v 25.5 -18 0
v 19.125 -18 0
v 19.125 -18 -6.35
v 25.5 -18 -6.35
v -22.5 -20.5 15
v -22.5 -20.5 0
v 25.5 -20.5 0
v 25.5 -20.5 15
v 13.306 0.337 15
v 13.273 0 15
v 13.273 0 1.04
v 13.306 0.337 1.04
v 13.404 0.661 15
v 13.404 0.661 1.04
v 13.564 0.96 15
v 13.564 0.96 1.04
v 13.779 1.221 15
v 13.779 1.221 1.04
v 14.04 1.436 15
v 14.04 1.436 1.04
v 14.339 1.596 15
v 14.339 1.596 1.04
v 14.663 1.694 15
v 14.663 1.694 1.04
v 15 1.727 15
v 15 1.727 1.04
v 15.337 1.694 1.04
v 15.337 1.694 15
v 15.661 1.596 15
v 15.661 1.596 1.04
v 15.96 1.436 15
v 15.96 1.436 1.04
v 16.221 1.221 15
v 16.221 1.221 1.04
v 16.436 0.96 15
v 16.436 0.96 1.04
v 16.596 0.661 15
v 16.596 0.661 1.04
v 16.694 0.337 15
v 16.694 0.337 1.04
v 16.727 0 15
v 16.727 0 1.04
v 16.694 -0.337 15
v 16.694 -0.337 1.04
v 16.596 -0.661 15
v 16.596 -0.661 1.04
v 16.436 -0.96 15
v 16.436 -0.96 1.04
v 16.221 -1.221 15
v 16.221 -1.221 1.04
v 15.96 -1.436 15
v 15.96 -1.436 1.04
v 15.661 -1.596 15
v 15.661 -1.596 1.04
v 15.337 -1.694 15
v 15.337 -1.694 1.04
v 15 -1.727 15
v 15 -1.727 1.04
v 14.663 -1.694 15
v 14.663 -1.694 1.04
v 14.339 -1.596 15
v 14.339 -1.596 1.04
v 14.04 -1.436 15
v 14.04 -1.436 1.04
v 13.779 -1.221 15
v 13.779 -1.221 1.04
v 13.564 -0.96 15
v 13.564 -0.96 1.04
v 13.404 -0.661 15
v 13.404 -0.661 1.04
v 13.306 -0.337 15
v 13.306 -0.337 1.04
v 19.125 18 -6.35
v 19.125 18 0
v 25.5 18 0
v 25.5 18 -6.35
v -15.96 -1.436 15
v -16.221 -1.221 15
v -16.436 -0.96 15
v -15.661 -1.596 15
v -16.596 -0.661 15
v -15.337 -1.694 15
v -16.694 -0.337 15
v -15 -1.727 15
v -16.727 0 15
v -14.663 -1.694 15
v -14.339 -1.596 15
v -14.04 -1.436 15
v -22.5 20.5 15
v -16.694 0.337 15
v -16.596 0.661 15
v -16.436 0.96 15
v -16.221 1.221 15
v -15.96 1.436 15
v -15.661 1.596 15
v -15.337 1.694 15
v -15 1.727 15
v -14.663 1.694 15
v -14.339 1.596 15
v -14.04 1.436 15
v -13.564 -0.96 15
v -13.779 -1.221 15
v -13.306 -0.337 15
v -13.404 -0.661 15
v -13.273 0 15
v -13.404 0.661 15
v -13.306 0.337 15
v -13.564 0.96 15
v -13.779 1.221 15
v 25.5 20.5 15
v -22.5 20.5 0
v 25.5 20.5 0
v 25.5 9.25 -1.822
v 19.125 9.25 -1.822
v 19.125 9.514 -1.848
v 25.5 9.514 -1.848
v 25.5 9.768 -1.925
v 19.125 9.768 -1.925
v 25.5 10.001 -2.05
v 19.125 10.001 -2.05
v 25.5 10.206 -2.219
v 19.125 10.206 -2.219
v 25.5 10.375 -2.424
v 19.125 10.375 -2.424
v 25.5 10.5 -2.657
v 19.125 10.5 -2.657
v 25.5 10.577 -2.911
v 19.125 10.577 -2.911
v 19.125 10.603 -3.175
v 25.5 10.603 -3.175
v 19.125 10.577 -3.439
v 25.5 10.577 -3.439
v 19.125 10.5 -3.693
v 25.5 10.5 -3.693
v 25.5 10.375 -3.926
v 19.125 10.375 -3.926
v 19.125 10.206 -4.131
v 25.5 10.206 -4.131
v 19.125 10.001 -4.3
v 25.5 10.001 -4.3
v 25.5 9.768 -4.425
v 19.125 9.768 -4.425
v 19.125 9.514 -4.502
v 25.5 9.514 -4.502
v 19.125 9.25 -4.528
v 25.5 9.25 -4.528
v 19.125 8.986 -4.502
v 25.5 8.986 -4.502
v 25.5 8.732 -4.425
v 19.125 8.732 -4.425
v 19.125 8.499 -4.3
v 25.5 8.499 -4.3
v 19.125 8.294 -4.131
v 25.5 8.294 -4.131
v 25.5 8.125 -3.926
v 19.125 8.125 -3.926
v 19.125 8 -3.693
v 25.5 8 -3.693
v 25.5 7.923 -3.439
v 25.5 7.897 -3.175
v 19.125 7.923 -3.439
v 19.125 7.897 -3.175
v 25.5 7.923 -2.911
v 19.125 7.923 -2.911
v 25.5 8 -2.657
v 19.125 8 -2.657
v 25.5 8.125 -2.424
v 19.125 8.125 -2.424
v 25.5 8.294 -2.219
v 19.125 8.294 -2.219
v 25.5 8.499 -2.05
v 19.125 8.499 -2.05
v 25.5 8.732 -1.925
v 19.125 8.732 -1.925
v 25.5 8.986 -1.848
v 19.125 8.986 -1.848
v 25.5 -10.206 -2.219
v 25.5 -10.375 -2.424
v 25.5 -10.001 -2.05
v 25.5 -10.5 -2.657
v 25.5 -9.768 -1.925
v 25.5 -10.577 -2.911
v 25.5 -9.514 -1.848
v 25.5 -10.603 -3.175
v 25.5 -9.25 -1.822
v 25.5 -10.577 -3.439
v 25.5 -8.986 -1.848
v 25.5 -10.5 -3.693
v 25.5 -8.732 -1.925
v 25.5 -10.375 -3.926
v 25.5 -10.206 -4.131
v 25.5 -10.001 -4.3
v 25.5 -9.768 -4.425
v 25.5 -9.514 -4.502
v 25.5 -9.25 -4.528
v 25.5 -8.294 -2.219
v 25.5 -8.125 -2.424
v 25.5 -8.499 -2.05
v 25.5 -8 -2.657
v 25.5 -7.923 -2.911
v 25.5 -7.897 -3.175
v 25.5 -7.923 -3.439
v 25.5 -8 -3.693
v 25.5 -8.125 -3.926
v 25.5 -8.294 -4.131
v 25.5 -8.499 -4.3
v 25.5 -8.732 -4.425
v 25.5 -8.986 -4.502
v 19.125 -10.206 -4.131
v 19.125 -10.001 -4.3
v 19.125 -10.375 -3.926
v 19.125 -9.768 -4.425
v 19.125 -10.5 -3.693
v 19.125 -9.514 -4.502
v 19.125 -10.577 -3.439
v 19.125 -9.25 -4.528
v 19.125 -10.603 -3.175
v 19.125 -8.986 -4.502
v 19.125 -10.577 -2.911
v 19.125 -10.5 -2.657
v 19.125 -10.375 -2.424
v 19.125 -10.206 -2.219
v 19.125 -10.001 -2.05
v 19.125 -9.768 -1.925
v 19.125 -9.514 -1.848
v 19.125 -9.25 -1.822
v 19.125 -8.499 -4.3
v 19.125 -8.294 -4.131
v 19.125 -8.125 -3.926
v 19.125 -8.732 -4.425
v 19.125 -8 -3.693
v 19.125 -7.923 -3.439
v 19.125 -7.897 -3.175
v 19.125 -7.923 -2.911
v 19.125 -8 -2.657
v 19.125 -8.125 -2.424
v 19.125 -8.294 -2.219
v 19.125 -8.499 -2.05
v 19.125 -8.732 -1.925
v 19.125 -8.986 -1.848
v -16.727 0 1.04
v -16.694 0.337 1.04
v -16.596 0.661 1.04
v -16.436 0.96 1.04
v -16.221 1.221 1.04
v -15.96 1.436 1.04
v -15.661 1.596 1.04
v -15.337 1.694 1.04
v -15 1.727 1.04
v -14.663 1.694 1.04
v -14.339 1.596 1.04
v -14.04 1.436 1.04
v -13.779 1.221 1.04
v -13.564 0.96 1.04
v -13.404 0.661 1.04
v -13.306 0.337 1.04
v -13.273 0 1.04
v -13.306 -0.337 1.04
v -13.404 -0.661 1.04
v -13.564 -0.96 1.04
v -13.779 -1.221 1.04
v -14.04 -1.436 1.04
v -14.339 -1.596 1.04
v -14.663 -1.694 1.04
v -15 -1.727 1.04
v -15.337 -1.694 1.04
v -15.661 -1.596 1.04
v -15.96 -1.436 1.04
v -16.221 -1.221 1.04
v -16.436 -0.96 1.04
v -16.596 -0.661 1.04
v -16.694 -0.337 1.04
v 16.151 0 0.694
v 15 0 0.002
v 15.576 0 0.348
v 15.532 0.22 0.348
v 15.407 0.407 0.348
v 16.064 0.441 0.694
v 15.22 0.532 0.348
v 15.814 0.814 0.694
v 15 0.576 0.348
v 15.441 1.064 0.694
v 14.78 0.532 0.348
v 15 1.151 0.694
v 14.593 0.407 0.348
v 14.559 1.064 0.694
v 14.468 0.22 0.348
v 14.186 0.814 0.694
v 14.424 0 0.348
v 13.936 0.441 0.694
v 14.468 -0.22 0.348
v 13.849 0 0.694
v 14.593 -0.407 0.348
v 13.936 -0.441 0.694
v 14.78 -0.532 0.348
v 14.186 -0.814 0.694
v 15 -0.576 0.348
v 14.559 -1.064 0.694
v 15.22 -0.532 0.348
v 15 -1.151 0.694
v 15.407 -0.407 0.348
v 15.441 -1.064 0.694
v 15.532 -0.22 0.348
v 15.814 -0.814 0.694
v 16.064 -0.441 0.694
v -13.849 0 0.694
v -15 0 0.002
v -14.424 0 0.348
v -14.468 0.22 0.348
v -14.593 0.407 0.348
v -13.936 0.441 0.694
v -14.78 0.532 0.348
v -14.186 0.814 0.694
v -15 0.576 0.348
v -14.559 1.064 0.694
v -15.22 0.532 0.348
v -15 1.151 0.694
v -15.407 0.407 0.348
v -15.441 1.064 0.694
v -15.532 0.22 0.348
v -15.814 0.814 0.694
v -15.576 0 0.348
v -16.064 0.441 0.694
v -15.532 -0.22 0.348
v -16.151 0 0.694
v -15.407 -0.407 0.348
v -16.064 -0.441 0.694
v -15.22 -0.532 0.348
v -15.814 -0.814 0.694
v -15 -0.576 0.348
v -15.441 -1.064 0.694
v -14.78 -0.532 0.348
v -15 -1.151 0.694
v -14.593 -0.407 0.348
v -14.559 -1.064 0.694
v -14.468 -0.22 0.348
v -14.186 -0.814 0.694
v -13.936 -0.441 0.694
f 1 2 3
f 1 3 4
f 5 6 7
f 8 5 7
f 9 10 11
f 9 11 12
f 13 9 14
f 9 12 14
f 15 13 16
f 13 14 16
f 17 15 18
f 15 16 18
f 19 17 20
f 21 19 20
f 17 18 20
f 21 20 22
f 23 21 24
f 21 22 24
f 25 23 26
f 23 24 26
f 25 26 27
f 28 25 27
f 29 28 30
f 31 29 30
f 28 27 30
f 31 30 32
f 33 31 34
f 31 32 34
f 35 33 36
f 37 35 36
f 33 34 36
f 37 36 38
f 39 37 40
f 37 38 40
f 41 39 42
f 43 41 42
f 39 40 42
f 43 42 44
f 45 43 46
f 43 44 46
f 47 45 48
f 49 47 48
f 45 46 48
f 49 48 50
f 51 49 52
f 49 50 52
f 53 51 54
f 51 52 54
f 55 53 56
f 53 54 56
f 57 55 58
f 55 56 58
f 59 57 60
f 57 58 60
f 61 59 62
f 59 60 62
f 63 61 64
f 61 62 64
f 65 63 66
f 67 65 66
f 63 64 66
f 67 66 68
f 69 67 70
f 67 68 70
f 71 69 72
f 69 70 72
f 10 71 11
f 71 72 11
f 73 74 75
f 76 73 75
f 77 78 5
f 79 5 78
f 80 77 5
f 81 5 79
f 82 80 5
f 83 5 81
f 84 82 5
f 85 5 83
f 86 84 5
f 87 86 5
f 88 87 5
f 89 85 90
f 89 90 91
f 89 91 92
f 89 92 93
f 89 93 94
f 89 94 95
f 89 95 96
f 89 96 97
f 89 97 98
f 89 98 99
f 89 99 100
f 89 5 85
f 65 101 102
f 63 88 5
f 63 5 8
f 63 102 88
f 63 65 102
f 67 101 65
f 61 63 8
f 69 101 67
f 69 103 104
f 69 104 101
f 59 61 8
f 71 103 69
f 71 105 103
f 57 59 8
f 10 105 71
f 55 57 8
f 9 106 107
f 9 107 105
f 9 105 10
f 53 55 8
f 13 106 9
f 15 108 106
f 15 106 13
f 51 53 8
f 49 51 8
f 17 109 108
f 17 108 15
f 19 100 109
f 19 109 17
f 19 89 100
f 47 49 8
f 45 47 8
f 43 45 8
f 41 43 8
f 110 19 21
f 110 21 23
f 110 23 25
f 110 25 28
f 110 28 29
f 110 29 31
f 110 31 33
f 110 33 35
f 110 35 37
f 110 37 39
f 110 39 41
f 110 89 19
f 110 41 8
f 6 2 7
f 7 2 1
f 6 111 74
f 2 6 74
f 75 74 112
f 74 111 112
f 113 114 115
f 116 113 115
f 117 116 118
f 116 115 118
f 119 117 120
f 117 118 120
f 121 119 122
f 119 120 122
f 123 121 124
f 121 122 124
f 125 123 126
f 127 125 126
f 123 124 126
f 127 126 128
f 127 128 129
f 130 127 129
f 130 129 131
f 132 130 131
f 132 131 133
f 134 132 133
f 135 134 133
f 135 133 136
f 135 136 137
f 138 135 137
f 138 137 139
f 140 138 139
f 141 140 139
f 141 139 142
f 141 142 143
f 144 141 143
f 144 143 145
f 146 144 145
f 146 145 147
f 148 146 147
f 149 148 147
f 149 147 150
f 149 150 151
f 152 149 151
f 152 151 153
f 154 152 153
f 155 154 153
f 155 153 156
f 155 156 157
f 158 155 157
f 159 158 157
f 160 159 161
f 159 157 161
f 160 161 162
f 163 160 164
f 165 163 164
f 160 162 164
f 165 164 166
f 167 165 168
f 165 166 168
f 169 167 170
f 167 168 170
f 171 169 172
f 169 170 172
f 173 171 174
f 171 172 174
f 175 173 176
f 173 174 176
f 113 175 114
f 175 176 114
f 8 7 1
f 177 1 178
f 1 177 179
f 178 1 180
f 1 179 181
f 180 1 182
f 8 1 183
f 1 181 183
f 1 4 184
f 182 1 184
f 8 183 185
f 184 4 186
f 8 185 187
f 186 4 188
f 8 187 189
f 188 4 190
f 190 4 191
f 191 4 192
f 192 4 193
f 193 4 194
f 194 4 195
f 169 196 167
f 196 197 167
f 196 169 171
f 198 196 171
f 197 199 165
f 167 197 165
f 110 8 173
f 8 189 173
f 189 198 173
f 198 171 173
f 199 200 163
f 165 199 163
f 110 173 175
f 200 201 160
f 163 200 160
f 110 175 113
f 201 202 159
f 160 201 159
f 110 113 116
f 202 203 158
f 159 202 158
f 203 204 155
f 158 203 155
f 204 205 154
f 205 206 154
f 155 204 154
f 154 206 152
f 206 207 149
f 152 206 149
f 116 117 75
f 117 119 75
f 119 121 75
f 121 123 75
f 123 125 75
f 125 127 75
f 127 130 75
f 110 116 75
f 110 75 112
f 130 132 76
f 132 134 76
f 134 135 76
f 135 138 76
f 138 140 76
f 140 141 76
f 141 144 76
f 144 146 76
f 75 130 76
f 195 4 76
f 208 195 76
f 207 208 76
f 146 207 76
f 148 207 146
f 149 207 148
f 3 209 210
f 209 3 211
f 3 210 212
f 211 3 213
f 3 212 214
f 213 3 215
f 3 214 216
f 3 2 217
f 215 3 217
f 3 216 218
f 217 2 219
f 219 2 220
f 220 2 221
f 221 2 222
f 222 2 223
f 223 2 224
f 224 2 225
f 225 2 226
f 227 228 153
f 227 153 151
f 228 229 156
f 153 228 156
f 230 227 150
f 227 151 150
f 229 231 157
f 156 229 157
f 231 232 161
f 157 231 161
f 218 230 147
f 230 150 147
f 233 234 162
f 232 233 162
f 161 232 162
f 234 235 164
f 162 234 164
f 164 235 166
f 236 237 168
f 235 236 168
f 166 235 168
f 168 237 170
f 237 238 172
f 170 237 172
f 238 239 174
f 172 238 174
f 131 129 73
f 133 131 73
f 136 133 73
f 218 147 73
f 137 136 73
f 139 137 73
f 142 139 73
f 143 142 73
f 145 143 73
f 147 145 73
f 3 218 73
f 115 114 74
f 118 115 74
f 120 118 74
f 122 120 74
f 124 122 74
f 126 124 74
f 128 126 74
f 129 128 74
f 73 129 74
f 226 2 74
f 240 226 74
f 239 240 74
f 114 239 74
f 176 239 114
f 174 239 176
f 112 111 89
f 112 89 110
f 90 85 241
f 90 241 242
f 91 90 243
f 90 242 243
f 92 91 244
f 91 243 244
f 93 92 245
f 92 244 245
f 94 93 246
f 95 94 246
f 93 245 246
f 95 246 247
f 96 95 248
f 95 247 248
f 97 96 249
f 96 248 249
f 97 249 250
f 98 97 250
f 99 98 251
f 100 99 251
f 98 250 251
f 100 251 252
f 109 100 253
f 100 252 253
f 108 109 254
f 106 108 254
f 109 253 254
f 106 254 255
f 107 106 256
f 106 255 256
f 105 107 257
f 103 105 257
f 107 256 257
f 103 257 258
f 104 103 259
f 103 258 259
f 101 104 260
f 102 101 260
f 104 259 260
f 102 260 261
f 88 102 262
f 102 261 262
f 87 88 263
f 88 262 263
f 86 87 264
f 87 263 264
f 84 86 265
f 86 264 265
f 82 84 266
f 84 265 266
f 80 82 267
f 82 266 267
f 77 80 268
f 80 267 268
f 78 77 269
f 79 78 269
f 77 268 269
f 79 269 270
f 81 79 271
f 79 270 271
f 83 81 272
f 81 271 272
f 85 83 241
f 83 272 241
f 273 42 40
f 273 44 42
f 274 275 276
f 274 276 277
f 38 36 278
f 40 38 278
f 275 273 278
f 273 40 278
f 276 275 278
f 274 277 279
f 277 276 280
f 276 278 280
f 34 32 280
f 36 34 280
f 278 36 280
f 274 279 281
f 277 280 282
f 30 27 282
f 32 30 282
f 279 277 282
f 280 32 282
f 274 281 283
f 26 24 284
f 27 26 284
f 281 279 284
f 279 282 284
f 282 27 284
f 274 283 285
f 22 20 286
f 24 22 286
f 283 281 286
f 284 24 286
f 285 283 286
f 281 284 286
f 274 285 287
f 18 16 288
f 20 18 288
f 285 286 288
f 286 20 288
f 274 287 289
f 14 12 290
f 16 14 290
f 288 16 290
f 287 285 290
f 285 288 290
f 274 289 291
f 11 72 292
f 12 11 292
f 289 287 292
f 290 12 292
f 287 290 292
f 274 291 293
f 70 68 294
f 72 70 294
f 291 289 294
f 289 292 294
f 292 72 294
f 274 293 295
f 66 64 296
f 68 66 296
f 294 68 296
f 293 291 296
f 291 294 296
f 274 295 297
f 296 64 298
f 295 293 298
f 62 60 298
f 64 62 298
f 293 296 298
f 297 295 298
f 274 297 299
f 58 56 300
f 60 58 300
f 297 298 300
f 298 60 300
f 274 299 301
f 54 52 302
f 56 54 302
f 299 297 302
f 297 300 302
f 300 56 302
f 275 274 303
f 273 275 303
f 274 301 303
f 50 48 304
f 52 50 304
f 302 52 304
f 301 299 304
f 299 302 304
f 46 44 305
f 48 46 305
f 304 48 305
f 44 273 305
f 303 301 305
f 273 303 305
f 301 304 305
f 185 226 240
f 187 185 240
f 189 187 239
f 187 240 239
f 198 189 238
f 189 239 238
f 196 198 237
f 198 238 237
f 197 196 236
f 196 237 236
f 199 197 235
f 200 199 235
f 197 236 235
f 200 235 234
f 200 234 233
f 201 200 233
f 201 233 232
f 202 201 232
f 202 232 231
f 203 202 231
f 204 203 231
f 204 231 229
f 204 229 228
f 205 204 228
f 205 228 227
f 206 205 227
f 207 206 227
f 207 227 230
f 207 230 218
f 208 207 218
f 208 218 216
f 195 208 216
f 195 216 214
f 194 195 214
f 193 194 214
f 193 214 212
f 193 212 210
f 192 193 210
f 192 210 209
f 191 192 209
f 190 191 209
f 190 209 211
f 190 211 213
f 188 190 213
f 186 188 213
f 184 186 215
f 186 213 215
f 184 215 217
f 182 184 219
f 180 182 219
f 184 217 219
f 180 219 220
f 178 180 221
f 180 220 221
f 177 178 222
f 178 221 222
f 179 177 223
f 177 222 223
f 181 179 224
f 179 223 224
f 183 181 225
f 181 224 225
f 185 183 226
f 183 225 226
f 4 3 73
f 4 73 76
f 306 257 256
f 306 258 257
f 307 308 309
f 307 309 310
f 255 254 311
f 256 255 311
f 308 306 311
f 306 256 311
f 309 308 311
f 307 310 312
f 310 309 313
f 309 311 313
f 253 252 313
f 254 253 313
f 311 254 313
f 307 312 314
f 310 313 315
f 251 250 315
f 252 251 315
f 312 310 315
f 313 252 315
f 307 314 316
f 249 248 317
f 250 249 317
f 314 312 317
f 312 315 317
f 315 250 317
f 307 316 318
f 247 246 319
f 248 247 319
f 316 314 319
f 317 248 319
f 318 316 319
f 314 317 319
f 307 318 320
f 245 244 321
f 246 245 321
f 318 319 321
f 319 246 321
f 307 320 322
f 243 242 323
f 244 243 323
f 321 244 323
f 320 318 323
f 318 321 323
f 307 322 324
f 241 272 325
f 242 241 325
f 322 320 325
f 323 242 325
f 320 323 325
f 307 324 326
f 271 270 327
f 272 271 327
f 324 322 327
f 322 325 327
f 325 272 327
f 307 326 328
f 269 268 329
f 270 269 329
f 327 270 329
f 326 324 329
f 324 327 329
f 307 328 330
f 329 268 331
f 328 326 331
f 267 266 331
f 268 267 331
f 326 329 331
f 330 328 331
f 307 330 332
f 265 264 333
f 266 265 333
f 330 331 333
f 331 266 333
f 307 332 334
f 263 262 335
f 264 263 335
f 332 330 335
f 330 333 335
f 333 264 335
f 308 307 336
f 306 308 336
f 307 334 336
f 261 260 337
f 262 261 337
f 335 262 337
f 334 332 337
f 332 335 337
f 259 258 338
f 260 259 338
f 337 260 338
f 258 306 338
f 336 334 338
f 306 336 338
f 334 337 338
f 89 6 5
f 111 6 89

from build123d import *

# Parameters (mm, degrees)
SKETCH1_W                 = 48
SKETCH1_H                 = 41
BASE_EXTRUSION_DEPTH      = 15
SKETCH1_14_W              = 6.375
SKETCH1_14_H              = 36
CLEARANCE_EXTENSION_DEPTH = 6.35
F_8_32_TAPPED_HOLE6_D     = 3.4544
F_8_32_TAPPED_HOLE6_DEPTH = 13.96
F_8_32_TAPPED_HOLE6_TIP   = 1.037806461
F_6_32_TAPPED_HOLE1_D     = 2.7051


with BuildPart() as part:
    # Sketch1 → Base Extrusion (new body)
    with BuildSketch(Plane.XY):
        with Locations((1.5, 0)):
            Rectangle(SKETCH1_W, SKETCH1_H)
    extrude(amount=BASE_EXTRUSION_DEPTH)

    # Sketch1<14> → Clearance Extension (add)
    with BuildSketch(Plane.XY):
        with Locations((22.3125, 0)):
            Rectangle(SKETCH1_14_W, SKETCH1_14_H)
    extrude(amount=-CLEARANCE_EXTENSION_DEPTH)

    # #8-32 Tapped Hole6
    with Locations(Plane(origin=(15, 0, 15), x_dir=(1, 0, 0), z_dir=(0, 0, 1))):
        with Locations((0, 0), (-30, 0)):
            Hole(F_8_32_TAPPED_HOLE6_D / 2, depth=F_8_32_TAPPED_HOLE6_DEPTH)
            with Locations((0, 0, -(F_8_32_TAPPED_HOLE6_DEPTH + F_8_32_TAPPED_HOLE6_TIP / 2))):  # 118° drill point
                Cone(0, F_8_32_TAPPED_HOLE6_D / 2, F_8_32_TAPPED_HOLE6_TIP, mode=Mode.SUBTRACT)

    # #6-32 Tapped Hole1 (through all)
    with Locations(Plane(origin=(25.5, 0, 0), x_dir=(0, 0, -1), z_dir=(1, 0, 0))):
        with Locations((3.175, 9.25), (3.175, -9.25)):
            Hole(F_6_32_TAPPED_HOLE1_D / 2)


solid = part.part
